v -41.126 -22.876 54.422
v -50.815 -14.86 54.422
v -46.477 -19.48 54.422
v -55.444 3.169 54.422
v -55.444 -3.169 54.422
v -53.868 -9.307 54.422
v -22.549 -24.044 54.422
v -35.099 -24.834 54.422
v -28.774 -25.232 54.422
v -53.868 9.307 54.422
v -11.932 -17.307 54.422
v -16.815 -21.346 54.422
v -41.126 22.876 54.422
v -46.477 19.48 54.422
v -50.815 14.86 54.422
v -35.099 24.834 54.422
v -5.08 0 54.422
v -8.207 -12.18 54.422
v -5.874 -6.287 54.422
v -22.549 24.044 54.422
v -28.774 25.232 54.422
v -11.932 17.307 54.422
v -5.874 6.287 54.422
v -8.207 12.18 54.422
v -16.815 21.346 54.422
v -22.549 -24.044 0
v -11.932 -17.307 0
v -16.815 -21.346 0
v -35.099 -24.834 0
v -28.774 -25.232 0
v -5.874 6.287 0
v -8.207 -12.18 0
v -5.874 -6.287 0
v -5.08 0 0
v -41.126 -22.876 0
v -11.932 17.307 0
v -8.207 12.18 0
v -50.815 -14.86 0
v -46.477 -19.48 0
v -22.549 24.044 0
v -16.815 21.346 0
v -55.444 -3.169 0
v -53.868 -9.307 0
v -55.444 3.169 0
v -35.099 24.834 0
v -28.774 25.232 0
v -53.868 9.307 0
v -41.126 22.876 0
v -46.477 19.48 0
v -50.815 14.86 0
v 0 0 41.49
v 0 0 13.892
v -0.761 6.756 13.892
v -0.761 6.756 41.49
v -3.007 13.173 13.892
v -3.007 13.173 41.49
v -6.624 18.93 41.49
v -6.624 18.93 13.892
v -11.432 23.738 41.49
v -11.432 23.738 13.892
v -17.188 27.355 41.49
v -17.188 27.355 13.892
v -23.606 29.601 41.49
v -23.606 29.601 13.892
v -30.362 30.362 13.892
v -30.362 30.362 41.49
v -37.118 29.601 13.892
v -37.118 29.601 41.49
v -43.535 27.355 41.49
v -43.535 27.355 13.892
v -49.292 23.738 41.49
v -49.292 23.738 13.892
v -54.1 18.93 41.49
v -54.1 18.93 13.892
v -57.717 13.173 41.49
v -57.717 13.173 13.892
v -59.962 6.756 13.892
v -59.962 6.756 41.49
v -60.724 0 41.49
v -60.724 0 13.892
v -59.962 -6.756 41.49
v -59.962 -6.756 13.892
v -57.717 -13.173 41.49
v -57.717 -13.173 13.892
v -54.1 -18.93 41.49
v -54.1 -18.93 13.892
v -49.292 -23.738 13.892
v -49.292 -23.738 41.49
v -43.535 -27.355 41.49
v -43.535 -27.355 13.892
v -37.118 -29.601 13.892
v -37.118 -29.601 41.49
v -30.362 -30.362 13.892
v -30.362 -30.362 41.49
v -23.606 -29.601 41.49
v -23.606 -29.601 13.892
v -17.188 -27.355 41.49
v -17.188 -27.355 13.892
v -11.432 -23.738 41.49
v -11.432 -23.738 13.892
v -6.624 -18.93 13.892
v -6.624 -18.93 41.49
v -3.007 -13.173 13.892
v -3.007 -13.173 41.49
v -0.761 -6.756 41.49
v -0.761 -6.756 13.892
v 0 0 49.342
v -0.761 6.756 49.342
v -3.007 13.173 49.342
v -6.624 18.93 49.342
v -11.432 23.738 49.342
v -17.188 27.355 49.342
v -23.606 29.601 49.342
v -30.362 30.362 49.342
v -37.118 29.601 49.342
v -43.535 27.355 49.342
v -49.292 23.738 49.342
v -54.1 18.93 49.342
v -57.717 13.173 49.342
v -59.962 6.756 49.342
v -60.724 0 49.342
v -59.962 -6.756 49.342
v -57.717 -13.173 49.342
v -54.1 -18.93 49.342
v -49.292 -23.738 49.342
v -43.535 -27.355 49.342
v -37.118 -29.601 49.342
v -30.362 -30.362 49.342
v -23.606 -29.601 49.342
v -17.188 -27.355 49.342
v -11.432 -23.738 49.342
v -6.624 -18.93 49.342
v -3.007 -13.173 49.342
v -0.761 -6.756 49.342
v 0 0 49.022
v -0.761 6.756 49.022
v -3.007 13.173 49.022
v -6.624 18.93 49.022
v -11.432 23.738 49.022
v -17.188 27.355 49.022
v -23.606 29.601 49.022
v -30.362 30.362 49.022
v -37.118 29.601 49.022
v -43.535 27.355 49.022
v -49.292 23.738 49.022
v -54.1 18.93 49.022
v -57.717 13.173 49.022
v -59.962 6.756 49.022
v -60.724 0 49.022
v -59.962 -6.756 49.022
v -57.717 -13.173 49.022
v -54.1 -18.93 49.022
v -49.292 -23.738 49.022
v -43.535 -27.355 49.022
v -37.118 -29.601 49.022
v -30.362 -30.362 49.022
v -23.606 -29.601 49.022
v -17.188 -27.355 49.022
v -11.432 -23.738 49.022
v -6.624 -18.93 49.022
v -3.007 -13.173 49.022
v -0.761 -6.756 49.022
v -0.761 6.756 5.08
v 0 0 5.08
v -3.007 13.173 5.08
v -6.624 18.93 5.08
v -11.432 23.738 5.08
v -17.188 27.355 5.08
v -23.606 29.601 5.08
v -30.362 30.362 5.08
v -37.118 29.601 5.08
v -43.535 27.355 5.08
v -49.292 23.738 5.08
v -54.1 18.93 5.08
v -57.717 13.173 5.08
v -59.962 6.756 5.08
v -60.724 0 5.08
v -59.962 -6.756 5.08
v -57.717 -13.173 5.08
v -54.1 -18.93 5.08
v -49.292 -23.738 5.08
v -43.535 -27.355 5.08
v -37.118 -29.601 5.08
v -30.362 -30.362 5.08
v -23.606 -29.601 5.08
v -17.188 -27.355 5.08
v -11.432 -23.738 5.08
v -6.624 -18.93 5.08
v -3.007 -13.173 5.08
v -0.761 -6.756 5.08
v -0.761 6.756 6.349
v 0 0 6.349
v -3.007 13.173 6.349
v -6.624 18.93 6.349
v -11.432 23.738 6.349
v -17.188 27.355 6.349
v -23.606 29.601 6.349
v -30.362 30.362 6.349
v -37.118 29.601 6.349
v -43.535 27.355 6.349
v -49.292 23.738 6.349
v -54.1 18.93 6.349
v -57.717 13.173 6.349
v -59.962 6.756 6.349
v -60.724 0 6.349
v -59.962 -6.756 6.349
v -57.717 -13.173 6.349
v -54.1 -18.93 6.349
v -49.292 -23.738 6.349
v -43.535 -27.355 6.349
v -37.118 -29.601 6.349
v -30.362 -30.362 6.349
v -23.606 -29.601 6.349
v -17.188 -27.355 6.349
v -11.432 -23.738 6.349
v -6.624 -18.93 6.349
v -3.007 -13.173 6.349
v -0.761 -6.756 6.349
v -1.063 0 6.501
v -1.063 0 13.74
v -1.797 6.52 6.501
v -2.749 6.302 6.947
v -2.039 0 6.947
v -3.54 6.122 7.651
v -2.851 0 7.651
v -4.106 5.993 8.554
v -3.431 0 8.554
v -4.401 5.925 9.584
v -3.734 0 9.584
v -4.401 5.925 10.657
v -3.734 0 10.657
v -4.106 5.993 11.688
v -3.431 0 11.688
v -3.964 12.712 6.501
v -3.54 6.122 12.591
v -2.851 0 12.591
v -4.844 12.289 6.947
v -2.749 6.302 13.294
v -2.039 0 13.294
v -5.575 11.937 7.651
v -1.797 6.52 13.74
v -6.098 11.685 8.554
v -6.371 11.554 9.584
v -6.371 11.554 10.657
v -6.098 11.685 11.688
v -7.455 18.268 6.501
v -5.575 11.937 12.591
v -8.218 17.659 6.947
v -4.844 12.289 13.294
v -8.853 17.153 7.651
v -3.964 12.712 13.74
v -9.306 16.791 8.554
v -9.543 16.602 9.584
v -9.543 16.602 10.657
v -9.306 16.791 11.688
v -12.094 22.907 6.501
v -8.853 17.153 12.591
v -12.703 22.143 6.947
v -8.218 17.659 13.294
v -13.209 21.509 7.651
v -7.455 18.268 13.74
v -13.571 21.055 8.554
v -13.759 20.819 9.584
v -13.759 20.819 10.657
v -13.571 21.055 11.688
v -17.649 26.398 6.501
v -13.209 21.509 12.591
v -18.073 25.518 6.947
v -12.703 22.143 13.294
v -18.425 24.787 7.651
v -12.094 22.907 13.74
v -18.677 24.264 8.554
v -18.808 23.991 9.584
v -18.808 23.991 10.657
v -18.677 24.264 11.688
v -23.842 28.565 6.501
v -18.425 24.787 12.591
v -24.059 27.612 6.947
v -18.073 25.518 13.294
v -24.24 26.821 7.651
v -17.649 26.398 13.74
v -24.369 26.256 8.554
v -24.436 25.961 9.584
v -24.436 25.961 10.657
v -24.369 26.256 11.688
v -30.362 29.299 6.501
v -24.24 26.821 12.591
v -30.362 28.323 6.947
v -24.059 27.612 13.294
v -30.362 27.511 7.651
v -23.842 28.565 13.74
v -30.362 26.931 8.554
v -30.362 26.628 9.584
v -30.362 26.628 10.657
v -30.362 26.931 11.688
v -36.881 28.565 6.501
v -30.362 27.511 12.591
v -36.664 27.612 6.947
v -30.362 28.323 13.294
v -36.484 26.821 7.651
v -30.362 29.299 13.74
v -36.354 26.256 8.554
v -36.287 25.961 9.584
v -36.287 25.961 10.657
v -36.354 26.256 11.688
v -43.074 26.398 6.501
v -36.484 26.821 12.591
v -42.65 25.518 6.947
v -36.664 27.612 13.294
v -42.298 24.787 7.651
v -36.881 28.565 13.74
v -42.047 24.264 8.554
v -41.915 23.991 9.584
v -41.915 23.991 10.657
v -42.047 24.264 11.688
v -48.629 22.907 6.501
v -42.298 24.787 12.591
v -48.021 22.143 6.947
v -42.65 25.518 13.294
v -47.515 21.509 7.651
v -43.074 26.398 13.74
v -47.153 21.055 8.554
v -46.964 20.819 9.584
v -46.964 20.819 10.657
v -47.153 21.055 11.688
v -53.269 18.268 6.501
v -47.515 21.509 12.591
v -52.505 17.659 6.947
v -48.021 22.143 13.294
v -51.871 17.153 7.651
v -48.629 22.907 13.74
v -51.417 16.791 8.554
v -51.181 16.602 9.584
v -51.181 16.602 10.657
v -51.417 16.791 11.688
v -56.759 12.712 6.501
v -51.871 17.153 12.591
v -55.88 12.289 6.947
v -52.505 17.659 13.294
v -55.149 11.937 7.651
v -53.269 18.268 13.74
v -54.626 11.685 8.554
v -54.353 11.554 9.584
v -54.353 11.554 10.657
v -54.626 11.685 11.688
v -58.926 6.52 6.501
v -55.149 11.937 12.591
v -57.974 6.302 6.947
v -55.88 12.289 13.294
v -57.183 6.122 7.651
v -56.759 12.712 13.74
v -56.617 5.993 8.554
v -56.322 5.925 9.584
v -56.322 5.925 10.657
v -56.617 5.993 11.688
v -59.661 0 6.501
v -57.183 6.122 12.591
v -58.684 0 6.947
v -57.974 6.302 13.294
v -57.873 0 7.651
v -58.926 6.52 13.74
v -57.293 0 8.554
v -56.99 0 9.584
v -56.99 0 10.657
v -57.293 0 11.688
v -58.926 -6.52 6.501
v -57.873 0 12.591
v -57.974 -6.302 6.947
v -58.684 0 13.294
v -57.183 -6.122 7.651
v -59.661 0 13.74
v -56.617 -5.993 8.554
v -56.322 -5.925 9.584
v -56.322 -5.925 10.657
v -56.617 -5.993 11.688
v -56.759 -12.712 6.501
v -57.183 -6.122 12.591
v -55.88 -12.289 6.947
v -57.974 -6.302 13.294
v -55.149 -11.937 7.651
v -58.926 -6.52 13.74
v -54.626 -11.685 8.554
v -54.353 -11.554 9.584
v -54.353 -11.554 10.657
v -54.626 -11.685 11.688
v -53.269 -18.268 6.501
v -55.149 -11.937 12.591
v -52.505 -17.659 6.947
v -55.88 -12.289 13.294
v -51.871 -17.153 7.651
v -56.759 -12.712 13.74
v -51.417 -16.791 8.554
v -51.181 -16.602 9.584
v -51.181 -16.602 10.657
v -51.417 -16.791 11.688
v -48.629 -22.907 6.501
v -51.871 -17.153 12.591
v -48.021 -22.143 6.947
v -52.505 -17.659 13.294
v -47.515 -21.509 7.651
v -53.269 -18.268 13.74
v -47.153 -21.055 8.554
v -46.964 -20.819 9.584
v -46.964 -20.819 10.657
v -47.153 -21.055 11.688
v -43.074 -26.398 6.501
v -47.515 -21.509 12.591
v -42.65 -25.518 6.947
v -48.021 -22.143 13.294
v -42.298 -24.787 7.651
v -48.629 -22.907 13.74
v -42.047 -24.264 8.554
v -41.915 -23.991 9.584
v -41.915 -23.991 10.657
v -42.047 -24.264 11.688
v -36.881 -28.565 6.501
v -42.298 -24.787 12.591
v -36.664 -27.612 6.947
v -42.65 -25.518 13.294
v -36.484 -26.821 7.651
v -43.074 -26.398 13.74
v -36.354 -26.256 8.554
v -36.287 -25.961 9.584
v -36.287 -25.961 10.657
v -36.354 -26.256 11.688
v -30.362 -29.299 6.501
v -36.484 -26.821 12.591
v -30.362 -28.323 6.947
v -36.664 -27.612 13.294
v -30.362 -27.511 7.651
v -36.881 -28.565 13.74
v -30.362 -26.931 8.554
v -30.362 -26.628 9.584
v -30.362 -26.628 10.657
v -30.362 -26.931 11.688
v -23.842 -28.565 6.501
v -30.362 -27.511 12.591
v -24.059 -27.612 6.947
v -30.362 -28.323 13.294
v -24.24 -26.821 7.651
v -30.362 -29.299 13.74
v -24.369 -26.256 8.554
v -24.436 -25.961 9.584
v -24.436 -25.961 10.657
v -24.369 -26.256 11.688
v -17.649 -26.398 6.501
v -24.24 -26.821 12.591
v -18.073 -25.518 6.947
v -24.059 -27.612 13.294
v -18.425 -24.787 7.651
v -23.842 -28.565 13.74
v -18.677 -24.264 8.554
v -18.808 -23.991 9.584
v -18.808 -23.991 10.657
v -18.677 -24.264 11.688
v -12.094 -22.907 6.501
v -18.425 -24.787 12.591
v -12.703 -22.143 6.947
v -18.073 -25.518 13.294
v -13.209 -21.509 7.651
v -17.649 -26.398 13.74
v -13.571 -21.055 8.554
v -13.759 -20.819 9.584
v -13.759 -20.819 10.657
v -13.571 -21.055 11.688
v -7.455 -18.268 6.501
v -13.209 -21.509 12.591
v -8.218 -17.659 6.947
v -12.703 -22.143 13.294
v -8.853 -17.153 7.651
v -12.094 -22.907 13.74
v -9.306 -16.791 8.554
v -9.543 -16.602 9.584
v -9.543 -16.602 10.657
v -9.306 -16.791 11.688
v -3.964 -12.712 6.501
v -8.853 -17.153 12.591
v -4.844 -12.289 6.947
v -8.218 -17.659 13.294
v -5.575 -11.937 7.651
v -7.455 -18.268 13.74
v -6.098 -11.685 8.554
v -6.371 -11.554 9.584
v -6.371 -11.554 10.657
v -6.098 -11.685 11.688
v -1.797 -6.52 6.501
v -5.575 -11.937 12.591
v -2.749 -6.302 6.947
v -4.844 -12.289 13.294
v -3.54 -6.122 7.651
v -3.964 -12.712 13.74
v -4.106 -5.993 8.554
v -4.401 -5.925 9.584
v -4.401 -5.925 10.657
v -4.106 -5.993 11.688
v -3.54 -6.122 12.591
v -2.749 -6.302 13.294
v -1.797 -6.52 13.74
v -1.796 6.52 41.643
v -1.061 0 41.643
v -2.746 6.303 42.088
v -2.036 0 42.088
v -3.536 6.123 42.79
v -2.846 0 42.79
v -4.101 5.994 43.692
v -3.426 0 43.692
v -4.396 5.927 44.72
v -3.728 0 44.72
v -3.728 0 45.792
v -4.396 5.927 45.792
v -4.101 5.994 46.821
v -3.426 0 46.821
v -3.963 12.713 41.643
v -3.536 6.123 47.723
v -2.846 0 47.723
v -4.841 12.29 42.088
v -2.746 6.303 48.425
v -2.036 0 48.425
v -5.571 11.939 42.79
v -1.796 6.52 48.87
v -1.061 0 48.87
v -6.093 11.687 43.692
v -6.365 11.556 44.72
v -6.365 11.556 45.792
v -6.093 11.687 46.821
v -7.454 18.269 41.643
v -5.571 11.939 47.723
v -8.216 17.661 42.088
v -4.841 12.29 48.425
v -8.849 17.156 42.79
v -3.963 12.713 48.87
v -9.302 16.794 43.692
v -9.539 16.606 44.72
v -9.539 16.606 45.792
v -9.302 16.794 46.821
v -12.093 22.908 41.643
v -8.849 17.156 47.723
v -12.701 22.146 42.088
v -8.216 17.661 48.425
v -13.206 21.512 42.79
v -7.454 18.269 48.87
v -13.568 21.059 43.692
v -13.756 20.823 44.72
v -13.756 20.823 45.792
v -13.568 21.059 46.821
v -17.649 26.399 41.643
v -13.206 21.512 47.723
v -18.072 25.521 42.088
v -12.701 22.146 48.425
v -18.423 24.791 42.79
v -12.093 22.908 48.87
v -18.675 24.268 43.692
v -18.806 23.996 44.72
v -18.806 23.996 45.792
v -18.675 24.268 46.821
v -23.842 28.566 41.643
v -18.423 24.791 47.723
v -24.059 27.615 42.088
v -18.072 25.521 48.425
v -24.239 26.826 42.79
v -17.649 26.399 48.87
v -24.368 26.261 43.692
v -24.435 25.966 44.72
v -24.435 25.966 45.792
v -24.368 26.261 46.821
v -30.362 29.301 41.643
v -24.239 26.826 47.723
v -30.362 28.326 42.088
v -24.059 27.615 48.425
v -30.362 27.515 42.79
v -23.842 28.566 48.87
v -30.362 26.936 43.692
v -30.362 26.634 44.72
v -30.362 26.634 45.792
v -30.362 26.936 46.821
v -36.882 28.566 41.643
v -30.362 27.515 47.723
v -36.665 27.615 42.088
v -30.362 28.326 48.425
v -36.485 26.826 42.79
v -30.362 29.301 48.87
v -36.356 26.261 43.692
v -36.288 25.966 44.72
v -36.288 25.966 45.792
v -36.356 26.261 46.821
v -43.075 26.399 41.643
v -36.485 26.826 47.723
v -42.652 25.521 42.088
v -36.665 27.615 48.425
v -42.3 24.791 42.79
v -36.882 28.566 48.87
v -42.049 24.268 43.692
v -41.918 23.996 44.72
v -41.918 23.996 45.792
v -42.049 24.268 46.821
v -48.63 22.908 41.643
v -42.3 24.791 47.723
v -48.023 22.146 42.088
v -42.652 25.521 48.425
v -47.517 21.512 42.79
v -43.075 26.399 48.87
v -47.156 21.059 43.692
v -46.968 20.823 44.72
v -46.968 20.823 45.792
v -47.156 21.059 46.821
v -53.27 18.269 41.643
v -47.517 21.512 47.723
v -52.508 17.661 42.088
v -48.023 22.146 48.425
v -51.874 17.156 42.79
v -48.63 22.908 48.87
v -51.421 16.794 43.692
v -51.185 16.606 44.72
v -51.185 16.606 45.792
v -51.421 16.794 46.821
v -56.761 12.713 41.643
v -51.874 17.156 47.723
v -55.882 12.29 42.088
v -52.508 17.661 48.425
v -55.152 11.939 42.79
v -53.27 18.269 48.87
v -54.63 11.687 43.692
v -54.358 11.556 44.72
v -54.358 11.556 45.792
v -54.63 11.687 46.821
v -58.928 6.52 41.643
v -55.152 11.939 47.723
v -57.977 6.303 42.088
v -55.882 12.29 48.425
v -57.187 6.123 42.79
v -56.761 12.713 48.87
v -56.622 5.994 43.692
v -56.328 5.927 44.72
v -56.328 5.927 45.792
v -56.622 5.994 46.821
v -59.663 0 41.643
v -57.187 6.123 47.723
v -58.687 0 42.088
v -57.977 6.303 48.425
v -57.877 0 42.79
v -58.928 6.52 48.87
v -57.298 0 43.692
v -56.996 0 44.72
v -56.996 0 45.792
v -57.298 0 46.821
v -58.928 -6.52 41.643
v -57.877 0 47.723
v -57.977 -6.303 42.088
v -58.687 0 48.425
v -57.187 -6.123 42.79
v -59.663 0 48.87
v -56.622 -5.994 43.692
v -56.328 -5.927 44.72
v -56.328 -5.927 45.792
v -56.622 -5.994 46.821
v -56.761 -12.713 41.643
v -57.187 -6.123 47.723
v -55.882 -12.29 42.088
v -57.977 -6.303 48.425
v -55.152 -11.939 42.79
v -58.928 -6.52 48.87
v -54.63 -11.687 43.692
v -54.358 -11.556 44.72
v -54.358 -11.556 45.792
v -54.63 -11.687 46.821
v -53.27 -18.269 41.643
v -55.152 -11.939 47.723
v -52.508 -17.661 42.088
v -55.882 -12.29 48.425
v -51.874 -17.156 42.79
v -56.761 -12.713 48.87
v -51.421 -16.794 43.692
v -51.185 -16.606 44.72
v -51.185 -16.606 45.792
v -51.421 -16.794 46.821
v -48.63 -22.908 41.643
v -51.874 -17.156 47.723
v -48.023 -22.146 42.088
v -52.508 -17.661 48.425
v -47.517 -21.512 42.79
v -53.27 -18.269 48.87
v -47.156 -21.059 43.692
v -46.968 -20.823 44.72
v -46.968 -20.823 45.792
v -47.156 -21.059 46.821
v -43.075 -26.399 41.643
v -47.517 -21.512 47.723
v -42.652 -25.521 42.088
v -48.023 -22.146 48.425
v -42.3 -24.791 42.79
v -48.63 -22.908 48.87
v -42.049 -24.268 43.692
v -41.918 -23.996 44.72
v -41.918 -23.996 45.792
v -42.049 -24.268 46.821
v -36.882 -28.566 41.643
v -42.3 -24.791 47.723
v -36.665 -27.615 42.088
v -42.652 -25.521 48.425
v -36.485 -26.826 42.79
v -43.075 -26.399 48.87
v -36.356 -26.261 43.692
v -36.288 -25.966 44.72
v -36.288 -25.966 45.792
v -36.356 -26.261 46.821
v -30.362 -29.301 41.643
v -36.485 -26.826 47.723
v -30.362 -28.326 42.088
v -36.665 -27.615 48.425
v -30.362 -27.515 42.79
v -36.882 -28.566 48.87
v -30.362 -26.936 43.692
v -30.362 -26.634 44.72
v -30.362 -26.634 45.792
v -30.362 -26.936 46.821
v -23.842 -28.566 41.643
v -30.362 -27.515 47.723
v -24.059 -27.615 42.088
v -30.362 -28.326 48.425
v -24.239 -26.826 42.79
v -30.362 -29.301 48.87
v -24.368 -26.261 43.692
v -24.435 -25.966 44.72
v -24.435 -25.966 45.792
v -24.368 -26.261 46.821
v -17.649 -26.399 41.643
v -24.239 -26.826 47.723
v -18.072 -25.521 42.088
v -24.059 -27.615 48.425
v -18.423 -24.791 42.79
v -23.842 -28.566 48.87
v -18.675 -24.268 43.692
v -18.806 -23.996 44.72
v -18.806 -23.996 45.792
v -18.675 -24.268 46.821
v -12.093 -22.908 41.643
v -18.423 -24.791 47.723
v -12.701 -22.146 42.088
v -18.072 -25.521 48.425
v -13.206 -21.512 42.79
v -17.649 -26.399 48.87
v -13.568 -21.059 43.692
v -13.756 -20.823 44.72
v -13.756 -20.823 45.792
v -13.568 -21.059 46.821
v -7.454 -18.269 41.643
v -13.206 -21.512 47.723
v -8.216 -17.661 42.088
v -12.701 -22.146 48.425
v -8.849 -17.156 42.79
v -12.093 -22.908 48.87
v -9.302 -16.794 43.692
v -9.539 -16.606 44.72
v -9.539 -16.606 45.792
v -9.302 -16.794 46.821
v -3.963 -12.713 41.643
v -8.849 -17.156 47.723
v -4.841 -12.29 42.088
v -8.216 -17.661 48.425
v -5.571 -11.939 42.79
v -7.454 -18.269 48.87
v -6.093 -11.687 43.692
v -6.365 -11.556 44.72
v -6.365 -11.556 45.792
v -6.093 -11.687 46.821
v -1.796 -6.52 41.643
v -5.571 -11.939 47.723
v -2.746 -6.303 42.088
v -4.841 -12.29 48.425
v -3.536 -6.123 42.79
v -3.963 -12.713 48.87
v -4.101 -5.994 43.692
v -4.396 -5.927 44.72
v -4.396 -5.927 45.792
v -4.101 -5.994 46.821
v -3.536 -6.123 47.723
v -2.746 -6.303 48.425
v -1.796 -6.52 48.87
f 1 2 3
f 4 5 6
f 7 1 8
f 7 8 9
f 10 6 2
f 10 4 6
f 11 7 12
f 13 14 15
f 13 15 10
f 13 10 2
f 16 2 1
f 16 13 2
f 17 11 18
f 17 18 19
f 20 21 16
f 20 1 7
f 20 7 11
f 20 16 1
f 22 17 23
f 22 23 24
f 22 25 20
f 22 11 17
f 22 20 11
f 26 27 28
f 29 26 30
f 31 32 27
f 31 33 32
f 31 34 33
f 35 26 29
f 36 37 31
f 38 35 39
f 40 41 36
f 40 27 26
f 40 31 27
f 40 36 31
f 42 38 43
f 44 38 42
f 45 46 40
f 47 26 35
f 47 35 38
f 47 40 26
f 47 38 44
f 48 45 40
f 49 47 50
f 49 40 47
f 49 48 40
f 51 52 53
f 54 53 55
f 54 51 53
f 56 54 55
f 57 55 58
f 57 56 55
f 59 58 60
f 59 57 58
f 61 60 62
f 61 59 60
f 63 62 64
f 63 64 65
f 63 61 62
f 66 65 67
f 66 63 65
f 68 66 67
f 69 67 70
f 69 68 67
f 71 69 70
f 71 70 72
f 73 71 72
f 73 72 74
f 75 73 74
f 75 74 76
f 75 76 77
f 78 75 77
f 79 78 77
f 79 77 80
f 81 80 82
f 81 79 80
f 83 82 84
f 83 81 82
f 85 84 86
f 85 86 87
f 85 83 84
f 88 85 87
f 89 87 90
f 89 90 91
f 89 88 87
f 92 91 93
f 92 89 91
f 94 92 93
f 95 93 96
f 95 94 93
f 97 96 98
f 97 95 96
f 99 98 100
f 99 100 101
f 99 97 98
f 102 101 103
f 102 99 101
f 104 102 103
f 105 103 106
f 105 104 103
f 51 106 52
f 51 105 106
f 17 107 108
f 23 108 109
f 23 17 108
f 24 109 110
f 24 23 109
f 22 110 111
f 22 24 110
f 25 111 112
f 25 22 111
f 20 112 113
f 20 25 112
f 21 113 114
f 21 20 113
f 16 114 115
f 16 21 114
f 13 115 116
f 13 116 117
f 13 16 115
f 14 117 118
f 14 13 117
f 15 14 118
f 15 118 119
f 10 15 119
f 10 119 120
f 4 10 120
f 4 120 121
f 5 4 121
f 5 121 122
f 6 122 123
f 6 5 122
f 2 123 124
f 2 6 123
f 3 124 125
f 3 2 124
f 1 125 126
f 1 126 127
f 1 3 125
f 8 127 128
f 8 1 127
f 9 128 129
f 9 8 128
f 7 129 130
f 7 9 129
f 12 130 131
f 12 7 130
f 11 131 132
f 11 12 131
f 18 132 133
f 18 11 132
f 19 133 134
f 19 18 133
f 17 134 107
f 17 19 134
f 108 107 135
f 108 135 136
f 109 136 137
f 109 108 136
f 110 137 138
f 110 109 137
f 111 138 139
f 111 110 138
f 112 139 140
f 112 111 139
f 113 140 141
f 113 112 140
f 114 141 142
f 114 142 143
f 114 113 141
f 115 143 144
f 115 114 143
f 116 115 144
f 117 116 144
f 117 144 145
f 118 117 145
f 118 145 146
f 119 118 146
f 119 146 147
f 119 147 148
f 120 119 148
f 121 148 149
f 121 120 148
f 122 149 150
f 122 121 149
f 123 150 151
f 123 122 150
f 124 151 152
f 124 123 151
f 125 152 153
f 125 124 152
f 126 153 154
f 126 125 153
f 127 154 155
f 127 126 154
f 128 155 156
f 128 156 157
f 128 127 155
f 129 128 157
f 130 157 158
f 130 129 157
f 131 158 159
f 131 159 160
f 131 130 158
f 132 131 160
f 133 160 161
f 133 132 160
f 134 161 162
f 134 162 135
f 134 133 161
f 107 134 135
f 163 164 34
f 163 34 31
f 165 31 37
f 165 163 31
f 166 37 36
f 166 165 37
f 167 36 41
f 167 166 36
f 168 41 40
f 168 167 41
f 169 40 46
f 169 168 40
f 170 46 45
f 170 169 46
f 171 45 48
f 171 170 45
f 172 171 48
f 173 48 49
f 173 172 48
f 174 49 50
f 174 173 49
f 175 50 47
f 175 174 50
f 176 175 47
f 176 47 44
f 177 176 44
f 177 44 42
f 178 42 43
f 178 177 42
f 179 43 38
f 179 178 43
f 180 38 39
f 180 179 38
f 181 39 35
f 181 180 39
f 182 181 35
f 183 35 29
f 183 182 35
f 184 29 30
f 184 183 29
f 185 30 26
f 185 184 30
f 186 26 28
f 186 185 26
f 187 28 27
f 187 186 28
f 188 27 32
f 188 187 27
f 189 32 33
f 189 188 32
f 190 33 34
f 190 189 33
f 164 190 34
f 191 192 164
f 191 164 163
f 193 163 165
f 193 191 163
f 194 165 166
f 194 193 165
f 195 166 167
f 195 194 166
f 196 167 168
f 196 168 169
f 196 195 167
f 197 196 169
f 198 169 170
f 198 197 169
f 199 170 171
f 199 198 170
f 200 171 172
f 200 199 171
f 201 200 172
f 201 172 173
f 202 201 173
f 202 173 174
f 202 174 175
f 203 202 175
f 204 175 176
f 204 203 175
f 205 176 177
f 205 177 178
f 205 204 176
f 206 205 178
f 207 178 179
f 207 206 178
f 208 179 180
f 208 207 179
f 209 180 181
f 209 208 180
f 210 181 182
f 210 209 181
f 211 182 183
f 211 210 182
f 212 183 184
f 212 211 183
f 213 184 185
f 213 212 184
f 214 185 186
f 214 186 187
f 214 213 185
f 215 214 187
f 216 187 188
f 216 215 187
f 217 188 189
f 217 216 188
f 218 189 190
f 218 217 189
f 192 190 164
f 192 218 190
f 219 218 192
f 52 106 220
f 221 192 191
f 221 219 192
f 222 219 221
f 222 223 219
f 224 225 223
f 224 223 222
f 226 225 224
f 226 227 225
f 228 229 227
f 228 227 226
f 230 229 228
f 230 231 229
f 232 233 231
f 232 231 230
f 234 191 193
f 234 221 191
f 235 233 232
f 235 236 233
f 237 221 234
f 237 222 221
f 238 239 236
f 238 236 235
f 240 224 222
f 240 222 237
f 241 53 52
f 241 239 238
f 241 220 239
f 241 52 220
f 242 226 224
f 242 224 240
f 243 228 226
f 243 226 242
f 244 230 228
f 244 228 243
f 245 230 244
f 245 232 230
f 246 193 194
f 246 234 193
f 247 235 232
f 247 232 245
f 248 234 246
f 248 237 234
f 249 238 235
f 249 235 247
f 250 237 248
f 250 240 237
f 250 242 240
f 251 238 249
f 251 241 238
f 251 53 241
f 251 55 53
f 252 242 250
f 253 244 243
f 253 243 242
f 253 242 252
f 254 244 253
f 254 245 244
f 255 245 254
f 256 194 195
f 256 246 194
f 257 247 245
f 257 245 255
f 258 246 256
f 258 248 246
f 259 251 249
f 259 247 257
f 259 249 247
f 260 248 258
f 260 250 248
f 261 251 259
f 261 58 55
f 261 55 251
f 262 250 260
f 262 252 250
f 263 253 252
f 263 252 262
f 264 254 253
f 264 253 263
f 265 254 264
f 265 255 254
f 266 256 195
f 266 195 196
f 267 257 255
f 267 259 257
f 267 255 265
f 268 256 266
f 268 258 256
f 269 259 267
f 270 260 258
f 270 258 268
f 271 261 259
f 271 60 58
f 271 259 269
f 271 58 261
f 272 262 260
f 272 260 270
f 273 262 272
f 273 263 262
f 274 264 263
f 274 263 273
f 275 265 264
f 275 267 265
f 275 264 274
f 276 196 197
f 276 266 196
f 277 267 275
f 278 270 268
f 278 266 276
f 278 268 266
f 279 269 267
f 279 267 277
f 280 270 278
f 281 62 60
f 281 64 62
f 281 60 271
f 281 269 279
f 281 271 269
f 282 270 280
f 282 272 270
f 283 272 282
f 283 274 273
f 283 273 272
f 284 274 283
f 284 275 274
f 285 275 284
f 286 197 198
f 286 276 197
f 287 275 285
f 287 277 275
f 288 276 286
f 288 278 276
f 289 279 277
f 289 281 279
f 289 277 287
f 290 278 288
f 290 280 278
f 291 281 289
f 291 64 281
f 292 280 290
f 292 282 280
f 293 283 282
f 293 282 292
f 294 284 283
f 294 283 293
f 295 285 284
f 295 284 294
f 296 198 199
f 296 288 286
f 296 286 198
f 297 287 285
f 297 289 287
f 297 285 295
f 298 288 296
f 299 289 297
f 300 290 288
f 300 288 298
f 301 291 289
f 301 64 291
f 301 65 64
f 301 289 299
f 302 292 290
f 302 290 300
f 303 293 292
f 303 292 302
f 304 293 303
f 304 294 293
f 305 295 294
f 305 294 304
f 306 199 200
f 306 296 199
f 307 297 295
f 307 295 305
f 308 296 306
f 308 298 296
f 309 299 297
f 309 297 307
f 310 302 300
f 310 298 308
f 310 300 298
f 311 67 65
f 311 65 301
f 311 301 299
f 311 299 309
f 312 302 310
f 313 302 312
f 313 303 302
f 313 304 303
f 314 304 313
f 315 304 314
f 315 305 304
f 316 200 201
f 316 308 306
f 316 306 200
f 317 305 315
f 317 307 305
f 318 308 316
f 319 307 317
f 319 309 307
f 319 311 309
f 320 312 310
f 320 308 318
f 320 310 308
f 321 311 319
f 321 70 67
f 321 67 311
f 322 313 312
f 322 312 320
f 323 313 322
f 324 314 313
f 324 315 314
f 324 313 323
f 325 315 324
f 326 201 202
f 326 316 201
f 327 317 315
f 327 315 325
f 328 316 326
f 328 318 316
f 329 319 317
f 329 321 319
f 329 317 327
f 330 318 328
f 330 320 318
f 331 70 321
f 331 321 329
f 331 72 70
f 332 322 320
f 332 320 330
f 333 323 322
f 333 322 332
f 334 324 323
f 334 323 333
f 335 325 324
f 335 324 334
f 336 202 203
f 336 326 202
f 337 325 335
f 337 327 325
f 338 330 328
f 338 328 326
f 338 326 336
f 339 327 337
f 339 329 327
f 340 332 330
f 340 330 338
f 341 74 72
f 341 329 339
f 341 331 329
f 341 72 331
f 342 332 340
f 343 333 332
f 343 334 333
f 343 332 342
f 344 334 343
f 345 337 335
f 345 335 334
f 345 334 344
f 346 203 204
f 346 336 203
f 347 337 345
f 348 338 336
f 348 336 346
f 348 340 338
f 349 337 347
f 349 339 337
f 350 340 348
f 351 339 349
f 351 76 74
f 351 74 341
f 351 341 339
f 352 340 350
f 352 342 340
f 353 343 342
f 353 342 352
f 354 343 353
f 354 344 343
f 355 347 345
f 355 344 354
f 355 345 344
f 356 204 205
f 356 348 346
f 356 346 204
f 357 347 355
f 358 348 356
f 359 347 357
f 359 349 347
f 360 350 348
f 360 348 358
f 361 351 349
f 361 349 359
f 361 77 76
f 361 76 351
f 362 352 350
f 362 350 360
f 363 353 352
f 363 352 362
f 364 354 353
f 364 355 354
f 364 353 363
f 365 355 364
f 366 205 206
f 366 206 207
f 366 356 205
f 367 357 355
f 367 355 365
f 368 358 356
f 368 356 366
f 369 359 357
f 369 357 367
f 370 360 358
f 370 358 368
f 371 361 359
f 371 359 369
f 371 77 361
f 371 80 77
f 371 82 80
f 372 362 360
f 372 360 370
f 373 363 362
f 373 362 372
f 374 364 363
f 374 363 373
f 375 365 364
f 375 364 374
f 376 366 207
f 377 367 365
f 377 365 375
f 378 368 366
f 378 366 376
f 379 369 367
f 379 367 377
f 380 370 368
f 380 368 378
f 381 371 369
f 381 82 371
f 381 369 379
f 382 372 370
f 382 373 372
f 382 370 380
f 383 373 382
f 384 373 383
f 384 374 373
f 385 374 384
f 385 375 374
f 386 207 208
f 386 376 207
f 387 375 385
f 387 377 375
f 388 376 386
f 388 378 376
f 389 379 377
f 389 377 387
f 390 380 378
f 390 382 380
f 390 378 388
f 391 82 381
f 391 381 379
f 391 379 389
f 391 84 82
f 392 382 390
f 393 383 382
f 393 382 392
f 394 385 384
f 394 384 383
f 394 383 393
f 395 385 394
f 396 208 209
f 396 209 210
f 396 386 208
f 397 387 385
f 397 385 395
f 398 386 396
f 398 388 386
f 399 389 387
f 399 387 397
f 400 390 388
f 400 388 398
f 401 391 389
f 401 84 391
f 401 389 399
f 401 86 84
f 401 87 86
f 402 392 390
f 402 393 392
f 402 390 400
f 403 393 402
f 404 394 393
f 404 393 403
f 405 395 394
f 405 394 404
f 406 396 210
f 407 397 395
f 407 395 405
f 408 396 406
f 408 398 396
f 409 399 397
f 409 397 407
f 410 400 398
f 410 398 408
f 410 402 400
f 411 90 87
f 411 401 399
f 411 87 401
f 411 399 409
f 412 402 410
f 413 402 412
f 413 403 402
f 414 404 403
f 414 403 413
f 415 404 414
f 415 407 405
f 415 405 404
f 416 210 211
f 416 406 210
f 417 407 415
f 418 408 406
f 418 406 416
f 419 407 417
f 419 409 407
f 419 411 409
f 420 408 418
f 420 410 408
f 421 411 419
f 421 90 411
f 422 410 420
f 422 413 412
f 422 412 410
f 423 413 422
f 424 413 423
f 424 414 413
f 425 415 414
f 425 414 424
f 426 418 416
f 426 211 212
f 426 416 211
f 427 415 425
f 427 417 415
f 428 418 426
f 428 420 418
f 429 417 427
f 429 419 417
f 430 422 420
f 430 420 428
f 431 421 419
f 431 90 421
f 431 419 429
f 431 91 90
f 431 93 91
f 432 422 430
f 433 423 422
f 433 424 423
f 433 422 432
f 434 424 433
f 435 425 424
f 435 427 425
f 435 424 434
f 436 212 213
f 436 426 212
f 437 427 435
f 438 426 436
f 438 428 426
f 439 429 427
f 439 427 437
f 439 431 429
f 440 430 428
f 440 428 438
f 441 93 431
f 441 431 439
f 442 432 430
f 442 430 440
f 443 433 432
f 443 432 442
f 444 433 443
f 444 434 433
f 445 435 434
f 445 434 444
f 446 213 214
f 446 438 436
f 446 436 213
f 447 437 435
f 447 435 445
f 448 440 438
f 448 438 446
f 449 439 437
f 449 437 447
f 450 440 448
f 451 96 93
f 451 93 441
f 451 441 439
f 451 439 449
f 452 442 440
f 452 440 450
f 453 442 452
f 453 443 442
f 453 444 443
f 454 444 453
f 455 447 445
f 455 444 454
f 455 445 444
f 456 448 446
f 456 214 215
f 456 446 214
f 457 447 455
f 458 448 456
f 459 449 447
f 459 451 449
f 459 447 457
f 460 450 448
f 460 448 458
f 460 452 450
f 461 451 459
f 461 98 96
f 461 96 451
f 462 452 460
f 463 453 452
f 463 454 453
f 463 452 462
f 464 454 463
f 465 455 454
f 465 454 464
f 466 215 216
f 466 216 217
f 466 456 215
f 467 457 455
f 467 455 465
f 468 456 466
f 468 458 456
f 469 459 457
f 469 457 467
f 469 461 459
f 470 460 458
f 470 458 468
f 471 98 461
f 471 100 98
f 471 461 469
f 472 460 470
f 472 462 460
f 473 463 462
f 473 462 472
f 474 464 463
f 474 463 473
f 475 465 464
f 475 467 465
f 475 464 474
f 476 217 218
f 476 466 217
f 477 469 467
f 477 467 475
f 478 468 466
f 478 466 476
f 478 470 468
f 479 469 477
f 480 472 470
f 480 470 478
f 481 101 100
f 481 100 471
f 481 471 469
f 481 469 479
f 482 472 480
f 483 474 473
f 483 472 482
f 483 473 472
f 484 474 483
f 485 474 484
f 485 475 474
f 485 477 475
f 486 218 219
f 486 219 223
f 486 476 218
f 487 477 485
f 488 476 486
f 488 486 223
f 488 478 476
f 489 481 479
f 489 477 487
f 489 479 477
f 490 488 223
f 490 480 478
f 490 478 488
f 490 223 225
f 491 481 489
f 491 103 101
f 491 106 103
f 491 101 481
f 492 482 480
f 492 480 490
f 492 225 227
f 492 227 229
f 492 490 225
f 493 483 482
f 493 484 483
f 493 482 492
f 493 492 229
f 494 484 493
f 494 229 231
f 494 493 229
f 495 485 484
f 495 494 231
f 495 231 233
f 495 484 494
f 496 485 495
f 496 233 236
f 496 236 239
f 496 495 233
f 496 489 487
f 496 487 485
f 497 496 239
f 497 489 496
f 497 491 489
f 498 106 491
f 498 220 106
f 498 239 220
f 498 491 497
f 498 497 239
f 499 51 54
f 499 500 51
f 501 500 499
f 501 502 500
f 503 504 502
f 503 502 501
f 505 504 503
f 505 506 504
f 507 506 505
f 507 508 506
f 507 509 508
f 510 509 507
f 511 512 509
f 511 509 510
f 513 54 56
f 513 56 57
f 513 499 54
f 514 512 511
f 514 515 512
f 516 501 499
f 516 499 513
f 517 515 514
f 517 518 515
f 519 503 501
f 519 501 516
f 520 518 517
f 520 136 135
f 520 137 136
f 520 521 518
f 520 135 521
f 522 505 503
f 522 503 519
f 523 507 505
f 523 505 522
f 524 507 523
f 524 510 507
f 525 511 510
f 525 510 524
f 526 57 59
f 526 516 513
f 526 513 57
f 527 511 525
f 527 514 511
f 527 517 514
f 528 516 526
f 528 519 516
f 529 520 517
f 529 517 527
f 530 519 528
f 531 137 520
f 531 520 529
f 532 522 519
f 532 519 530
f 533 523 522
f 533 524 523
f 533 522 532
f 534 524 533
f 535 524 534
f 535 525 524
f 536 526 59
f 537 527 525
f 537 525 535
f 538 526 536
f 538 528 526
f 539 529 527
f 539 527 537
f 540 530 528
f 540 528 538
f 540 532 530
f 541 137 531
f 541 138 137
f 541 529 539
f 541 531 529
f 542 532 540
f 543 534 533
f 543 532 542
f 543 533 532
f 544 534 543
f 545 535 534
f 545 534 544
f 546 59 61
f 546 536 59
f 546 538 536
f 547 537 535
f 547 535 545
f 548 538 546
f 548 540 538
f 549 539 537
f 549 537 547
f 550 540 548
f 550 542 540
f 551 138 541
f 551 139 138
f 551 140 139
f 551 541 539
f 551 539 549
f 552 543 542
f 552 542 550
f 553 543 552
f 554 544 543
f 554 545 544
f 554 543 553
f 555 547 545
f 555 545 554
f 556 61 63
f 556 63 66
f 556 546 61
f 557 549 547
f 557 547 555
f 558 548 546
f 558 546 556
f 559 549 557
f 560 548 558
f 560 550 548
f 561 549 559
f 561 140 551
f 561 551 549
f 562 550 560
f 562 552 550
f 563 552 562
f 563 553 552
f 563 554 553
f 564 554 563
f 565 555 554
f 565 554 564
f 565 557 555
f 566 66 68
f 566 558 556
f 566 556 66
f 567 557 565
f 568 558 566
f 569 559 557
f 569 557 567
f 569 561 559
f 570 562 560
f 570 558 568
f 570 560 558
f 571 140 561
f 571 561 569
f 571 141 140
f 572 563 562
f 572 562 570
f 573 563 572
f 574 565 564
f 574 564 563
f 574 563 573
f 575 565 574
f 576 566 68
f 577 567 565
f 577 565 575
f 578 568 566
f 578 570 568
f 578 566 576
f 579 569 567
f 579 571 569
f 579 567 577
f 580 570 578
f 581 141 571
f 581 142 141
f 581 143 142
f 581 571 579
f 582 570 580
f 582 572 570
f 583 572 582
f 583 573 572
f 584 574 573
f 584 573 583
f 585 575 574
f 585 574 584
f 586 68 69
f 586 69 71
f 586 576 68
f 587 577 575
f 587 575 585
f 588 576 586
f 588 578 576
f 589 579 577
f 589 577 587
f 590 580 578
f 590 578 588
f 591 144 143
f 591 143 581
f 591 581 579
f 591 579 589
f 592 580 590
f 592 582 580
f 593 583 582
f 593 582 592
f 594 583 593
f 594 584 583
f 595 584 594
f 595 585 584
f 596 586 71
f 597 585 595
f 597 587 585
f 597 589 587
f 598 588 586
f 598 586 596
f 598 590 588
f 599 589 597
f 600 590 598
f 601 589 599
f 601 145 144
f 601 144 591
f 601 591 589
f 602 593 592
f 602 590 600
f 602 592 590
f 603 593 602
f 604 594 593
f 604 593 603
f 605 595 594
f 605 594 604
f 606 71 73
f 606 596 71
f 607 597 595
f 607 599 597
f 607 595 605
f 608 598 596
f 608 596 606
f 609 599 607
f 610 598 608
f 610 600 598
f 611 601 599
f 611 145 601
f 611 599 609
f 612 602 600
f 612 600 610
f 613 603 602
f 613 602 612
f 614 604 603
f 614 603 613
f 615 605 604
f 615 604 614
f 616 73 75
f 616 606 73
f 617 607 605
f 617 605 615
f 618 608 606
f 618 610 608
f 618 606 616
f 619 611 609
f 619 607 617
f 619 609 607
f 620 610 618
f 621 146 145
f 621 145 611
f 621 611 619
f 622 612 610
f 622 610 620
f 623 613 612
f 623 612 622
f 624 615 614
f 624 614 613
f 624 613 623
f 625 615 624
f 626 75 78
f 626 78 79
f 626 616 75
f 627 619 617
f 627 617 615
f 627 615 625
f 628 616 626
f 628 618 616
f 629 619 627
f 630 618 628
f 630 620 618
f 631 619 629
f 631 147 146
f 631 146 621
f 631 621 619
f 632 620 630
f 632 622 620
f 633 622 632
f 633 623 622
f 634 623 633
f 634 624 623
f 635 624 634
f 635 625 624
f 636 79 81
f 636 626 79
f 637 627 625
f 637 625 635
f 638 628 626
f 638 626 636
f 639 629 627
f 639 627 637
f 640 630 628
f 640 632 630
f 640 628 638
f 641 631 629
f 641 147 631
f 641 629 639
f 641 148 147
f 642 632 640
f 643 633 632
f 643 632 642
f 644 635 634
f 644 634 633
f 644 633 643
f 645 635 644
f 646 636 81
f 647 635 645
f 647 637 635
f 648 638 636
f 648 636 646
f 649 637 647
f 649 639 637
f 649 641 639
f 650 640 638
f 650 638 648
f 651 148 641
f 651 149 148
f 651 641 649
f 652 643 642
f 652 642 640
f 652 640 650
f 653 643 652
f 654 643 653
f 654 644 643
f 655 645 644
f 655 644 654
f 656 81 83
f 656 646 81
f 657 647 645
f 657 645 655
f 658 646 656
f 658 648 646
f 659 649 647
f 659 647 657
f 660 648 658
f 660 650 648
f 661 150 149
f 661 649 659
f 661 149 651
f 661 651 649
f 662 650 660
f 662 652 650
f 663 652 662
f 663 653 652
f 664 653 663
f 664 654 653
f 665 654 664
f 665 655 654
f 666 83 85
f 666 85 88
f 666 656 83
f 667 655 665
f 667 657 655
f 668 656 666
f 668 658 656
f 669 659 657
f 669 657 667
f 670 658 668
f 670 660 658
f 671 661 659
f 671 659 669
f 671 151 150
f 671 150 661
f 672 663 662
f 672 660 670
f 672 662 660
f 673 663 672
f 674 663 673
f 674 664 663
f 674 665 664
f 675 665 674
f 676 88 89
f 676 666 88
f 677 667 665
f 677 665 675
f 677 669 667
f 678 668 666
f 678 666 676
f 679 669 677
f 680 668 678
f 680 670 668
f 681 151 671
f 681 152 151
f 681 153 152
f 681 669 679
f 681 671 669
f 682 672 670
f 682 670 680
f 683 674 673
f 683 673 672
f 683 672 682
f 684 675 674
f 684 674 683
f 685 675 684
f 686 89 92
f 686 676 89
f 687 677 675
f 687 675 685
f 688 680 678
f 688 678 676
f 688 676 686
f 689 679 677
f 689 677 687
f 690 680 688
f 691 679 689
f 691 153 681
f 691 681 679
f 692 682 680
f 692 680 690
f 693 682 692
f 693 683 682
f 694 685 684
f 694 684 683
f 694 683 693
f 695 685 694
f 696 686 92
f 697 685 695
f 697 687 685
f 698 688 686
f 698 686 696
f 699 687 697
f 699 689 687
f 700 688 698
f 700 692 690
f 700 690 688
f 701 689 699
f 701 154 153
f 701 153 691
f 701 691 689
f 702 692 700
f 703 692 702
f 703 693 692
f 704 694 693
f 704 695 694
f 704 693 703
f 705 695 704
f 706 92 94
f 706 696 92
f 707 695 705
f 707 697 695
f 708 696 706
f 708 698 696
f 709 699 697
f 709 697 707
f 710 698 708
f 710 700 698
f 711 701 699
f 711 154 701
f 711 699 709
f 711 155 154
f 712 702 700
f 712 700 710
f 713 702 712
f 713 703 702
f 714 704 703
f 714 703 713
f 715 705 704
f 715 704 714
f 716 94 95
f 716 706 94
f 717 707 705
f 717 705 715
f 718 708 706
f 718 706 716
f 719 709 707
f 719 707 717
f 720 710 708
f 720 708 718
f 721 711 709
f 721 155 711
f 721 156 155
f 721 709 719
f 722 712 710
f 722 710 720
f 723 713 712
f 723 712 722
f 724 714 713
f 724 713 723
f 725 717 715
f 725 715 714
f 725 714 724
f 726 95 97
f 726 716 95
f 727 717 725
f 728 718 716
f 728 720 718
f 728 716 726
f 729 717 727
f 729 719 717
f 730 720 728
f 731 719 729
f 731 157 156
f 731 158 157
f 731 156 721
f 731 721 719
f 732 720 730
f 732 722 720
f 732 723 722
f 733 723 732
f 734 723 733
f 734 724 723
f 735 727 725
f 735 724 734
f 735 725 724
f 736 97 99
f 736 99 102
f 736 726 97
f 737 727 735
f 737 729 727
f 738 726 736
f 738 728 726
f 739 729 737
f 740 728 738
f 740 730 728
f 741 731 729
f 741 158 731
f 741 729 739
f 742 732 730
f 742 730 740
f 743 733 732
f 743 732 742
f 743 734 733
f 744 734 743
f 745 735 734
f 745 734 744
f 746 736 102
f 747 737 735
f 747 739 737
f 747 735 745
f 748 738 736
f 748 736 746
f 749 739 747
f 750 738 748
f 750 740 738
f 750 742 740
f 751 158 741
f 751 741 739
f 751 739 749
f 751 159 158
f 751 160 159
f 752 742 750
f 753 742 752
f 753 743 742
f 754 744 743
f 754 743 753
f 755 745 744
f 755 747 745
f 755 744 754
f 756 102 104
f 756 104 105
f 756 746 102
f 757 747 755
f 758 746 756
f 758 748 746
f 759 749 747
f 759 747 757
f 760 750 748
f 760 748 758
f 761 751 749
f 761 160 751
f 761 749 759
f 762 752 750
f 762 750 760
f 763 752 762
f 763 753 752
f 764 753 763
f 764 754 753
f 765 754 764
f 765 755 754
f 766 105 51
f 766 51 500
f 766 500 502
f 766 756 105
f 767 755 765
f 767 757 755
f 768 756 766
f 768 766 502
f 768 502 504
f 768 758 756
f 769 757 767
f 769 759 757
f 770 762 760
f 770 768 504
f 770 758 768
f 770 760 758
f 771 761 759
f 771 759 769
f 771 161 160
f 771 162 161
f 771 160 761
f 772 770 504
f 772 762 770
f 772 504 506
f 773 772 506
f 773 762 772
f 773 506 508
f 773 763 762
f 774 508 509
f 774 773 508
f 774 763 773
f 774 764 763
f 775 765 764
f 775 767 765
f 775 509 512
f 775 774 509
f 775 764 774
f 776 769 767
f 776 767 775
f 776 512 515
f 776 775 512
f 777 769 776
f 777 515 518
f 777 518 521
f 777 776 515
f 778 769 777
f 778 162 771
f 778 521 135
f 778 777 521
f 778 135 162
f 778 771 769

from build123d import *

# Parameters (mm, degrees)
F2_SIZE = 5.08


with BuildPart() as f1:
    # F0 (on Front) → F1 (revolve)
    with BuildSketch(Plane.XZ):
        with BuildLine():
            Line((-30.36179, 0), (0, 0))
            Line((0, 0), (0, 6.348697))
            ThreePointArc((0, 6.348697), (-3.7719, 10.120597), (0, 13.892497))
            Line((0, 13.892497), (0, 41.490039))
            ThreePointArc((0, 41.490039), (-3.766214, 45.256253), (0, 49.022468))
            Line((0, 49.022468), (0, 54.422077))
            Line((0, 54.422077), (-30.36179, 54.422077))
            Line((-30.36179, 54.422077), (-30.36179, 0))
        make_face()
    revolve(axis=Axis((-30.36179, 0, 27.211038), (0, 0, 1)))

    # F2
    f2_edges = [f1.edges().sort_by_distance(p)[0] for p in [
        (-60.72358, 0, 54.422077),
        (-60.72358, 0, 0),
    ]]
    chamfer(f2_edges, length=F2_SIZE)


solid = f1.part
